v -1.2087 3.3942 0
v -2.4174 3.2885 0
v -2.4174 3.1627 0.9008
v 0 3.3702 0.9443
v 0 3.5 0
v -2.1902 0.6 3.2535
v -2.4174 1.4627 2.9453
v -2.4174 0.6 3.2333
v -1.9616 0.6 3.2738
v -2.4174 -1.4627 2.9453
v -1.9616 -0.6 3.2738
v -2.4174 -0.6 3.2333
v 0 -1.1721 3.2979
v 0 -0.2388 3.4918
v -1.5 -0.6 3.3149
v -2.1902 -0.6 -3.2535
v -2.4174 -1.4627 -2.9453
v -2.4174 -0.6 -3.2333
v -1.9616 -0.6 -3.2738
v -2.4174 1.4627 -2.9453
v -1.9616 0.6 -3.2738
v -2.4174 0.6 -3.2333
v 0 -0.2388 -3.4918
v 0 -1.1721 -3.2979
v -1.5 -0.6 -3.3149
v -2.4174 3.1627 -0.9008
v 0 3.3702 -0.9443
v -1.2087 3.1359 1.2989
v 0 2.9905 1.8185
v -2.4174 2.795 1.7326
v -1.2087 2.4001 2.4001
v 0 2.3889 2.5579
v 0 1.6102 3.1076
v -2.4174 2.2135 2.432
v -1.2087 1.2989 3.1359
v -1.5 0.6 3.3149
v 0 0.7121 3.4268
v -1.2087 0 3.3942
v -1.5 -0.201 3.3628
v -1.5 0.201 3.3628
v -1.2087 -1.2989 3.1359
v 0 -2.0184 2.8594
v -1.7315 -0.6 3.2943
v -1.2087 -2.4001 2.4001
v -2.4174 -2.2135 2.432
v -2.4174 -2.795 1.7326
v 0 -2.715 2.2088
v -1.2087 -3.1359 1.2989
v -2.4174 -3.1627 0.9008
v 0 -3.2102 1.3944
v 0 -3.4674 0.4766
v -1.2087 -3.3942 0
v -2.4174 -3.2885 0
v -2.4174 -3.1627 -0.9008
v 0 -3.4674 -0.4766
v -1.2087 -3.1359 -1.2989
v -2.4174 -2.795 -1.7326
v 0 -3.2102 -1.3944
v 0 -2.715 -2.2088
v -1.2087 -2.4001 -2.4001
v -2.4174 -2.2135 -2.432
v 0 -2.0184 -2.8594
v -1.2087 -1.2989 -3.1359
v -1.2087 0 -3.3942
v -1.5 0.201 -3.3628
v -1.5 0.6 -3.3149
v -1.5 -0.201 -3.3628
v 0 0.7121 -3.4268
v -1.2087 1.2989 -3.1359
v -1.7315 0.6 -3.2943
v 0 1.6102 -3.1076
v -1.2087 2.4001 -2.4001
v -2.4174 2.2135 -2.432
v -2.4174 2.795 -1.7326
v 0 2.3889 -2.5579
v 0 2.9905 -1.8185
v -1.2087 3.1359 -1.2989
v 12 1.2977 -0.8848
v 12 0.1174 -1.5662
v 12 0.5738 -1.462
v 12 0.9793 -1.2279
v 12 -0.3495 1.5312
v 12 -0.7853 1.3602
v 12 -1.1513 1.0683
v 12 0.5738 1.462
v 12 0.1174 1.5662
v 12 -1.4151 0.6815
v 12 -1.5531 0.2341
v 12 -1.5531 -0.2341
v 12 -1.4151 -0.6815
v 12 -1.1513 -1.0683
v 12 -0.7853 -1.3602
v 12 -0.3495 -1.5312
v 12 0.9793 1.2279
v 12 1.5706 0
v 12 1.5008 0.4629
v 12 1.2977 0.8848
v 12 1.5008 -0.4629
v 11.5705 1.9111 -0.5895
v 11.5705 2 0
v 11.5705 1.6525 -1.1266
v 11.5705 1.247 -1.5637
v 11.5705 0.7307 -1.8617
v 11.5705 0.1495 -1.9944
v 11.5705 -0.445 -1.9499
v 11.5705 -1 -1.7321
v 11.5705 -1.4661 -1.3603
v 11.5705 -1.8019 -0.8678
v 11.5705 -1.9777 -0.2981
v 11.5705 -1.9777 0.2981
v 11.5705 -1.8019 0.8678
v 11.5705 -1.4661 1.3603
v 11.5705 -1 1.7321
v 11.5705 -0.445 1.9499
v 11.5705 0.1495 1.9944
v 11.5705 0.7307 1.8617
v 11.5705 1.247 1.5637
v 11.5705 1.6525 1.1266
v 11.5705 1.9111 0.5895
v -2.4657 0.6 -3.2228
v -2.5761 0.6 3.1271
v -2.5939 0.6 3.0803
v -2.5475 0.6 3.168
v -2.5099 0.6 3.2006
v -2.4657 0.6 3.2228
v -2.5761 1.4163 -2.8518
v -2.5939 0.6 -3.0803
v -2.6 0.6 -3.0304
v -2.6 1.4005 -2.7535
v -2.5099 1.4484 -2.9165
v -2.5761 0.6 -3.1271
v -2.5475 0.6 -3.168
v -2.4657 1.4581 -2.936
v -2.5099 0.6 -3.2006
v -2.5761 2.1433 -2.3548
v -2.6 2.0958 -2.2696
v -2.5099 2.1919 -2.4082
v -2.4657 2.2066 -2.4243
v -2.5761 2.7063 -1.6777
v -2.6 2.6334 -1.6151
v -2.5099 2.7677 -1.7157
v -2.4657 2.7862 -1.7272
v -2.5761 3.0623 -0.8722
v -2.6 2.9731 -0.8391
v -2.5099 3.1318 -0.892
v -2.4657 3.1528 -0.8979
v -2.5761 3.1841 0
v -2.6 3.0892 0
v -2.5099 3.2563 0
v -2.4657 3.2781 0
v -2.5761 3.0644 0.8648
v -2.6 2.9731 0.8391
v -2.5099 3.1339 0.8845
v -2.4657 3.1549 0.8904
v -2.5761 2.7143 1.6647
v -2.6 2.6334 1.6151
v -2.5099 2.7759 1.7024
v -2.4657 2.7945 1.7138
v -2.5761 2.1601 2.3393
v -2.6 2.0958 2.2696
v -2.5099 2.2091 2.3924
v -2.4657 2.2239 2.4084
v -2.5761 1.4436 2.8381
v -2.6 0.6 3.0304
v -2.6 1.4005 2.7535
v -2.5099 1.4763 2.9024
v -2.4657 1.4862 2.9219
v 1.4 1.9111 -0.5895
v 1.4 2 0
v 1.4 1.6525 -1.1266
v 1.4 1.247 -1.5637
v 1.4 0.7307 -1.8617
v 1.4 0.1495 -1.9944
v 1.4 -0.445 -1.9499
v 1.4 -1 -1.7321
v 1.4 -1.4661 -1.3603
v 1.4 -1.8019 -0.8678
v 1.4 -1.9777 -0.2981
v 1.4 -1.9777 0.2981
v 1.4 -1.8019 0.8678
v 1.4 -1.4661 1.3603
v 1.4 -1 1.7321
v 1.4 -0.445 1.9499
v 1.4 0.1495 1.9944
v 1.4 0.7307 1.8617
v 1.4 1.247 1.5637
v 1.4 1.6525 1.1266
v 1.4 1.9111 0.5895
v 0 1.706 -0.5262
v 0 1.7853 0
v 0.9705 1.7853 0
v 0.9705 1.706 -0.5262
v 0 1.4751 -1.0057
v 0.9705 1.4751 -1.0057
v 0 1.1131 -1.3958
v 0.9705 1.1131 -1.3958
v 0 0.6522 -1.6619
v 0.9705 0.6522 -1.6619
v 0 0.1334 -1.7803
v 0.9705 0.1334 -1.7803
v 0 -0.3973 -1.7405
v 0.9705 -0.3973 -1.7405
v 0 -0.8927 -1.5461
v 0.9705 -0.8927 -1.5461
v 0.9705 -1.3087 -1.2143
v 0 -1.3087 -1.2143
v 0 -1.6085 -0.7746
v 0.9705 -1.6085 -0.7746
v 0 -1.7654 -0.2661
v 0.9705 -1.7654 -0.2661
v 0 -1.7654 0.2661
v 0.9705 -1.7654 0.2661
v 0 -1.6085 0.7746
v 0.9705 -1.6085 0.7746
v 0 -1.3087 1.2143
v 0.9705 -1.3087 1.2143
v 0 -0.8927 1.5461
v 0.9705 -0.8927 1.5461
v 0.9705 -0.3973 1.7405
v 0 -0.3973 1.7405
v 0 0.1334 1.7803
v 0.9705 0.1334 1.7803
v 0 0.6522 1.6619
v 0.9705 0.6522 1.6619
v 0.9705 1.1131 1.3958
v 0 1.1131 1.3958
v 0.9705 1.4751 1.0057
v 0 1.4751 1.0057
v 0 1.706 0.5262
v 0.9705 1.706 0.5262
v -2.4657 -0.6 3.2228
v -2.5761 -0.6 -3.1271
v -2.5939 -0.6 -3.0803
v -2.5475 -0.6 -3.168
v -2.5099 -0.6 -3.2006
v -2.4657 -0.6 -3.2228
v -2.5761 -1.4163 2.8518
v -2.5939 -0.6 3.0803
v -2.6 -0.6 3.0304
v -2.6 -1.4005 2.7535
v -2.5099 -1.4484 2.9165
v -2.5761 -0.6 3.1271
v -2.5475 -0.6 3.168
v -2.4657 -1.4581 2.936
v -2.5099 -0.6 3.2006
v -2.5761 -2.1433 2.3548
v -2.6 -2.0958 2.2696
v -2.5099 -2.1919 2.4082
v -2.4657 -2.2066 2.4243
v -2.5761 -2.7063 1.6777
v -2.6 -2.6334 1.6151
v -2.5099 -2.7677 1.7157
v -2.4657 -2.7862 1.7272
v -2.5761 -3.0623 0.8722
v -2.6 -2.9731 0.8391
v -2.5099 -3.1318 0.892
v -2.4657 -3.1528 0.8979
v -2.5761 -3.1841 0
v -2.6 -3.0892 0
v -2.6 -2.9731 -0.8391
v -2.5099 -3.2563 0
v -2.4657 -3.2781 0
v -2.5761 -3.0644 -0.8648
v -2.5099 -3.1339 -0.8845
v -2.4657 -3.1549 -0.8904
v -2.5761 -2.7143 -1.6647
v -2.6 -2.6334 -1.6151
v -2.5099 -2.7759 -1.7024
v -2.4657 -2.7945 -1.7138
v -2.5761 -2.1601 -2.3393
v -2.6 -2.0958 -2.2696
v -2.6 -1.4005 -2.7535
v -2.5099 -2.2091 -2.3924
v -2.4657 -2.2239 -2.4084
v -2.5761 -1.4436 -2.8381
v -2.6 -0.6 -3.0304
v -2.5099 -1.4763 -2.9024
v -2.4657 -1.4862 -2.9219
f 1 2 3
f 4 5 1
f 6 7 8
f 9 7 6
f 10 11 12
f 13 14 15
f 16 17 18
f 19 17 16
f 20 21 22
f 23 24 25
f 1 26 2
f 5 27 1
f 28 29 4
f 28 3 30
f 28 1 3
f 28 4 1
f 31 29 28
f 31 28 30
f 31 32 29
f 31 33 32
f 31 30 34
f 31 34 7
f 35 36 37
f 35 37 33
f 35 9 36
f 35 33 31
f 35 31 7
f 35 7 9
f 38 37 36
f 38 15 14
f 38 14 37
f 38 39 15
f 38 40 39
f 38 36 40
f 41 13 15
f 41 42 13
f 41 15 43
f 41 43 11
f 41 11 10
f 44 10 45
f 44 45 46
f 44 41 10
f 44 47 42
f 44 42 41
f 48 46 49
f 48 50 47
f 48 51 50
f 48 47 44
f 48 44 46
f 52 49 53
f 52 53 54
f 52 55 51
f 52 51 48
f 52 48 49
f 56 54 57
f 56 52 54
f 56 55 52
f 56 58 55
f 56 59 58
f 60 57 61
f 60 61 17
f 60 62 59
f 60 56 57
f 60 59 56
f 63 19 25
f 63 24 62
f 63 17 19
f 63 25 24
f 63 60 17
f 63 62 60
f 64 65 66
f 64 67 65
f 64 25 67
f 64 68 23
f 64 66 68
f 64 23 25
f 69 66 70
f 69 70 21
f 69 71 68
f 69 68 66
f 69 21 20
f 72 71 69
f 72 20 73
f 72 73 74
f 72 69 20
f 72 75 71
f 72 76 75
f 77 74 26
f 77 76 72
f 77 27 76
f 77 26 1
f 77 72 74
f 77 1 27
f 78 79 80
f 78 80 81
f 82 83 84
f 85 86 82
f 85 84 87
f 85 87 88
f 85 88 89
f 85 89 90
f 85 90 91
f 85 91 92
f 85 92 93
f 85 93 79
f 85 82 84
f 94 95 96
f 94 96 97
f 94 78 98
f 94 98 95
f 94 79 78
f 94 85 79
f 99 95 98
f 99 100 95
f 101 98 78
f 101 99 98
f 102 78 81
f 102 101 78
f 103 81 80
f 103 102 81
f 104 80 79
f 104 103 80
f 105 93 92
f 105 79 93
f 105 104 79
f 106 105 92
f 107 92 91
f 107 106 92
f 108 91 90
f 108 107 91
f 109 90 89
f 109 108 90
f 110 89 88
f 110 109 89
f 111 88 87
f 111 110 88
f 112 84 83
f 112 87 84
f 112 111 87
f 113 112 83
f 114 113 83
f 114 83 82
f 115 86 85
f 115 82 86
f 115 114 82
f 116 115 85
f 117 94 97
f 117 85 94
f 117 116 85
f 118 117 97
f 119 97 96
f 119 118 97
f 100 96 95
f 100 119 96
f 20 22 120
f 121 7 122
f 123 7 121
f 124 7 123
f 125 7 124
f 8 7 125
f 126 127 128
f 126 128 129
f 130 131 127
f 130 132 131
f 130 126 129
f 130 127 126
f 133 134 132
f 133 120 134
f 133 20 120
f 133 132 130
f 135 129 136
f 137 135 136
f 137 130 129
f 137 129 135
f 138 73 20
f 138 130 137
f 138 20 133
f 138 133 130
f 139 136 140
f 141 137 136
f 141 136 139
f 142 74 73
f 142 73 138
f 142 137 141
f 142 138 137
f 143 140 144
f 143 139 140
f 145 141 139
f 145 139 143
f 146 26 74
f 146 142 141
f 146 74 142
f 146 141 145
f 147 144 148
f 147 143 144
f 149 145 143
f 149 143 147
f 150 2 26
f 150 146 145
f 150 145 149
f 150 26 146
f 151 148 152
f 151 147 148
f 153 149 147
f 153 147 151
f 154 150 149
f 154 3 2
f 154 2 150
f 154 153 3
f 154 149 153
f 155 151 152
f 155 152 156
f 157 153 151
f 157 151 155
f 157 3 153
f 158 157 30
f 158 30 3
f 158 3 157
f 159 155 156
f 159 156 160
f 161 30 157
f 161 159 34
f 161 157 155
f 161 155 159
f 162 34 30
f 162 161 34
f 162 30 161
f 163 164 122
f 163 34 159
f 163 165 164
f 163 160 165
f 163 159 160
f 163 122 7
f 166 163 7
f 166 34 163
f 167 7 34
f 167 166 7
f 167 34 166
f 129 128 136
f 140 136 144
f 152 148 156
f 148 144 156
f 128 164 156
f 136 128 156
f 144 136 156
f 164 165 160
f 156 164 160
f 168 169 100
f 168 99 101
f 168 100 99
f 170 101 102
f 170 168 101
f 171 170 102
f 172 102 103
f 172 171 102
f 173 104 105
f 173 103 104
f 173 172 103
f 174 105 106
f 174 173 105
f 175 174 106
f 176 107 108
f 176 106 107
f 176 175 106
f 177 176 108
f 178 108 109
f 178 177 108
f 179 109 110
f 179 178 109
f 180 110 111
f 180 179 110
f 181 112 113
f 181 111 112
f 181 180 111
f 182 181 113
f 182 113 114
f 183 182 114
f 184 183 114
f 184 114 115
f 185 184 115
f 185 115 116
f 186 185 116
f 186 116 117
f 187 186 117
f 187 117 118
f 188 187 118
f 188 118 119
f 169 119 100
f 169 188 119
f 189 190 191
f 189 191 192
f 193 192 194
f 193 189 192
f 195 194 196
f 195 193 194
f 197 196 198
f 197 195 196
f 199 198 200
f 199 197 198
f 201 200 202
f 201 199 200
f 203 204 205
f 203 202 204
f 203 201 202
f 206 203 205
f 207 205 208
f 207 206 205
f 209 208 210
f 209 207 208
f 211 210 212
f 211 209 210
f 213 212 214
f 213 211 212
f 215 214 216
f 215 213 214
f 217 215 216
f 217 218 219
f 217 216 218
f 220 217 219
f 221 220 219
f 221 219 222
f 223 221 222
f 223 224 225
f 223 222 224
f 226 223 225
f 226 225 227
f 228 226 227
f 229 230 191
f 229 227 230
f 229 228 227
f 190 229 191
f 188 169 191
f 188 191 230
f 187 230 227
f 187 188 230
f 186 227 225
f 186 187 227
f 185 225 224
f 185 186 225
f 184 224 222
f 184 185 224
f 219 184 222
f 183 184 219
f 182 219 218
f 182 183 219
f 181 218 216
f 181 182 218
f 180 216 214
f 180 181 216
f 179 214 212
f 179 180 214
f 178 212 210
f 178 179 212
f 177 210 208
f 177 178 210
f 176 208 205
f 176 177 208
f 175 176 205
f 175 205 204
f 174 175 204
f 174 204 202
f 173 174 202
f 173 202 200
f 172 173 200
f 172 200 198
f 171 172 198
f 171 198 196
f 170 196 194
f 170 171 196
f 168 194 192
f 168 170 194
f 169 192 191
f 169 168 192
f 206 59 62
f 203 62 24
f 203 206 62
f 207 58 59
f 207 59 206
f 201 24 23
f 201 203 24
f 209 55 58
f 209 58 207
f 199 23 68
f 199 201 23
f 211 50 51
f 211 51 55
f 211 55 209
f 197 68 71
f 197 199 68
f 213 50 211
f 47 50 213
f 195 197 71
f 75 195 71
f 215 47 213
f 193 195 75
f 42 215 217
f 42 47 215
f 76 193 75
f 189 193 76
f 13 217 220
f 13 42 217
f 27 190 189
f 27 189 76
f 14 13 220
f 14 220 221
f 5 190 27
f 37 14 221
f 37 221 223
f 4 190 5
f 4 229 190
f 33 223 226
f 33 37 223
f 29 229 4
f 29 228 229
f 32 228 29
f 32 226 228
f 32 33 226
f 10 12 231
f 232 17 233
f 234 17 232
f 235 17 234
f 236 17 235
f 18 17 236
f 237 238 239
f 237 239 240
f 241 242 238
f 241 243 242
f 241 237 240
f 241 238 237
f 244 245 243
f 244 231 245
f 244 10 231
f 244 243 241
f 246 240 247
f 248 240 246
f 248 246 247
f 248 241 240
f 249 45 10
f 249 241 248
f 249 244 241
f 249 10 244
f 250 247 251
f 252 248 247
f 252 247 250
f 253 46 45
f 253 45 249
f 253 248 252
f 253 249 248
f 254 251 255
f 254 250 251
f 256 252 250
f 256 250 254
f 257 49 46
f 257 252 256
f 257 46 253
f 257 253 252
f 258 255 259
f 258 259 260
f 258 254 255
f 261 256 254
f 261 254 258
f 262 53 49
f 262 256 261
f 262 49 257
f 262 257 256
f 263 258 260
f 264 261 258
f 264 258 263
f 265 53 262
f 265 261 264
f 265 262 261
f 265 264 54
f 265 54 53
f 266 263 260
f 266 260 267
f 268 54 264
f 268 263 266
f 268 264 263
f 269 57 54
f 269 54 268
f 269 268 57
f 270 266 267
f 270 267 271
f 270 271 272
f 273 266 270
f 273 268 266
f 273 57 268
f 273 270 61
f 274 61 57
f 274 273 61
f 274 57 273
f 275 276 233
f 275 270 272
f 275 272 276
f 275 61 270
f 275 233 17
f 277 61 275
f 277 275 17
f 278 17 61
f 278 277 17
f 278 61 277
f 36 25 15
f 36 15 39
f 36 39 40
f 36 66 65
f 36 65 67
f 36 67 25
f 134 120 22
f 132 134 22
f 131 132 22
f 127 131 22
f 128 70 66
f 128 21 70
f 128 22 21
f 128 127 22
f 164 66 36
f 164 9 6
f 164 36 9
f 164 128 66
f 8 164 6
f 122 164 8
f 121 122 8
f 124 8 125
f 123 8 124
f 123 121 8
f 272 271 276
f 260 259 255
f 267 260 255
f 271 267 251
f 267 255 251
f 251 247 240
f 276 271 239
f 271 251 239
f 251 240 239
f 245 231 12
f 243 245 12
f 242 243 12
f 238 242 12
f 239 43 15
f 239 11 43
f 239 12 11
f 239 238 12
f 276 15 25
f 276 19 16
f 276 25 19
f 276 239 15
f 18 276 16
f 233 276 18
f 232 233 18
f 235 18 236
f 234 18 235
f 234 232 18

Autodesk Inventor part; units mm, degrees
ref_plane "YZ Plane" through (0, 0, 0) normal (1, 0, 0) x (0, 1, 0)
ref_plane "XZ Plane" through (0, 0, 0) normal (0, 1, 0) x (-1, 0, 0)
sketch "Sketch1" plane through (0, 0, 0) normal (0, 0, 1) x (1, 0, 0)
  line L0 (-2.6, 0) -> (12, 0)
  line L1 (12, 0) -> (12, 2)
  line L2 (12, 2) -> (1.4, 2)
  line L3 (1.4, 2) -> (0.9705, 1.7853)
  line L4 (0.9705, 1.7853) -> (0, 1.7853)
  line L5 (0, 1.7853) -> (0, 3.5)
  line L6 (-5.52, 0) -> (14.92, 0) projected
  line L7 (0, -0.7) -> (0, 4.2) projected
  line L8 (-2.6, 0) -> (-2.6, 3.2725)
  line L9 (0, 3.5) -> (-2.6, 3.2725)
  line L10 (1.4, 2) -> (0, 2) construction
  dimension "d0" = 12
  dimension "d1" = 10.6
  dimension "d2" = 0.4295
  dimension "d3" = 2.6
  dimension "d4" = 4
  dimension "d5" = 3.5705
  dimension "d9" = 7
  dimension "d10" = 5
revolve "Body" add sketch "Sketch1" angle 360 about axis through (-2.6, 0, 0) along (1, 0, 0)
sketch "Sketch2" plane through (-2.6, 0, 0) normal (-1, 0, 0) x (0, 0, 1)
  circle A0 centre (0, 0) radius 3.5 projected
  line L0 (0, 0) -> (0, 3.2725) projected
  line L1 (-3.5, 0.6) -> (3.5, 0.6)
  line L2 (3.5, 0.6) -> (3.5, -0.6)
  line L3 (3.5, -0.6) -> (-3.5, -0.6)
  line L4 (-3.5, -0.6) -> (-3.5, 0.6)
  line L5 (-3.5, 0) -> (3.5, 0) construction
  line L6 (0, 0.6) -> (0, -0.6) construction
  dimension "d11" = 1.2
  dimension "d12" = 7
fillet "Fillet1" radius 0.2 1 edges at (-2.6, -3.2725, 0)
extrude "Slot" cut sketch "Sketch2" against normal blind 1.1 contours A0 L3 L1 | L2 L3 A0 | A0 L1 L2 | A0 L4 L1 | L3 L4 A0
thread "Thread" size "M4x0.7" class "6g" standard "ISO Metric profile" length 10.6
chamfer "Chamfer1" distance 0.4294 distance2 0.4295 1 edges at (12, -2, 0) measured on face at (12, 0.6473, -0.1595)
ref_plane "Work Plane1" through (30.1625, 0, 0) normal (0, 0, -1) x (1, 0, 0)
equation "\"d11\" = SBR"
equation "\"d12\" = KOD"
equation "\"d19\" = STI"
equation "\"d14\" = RR"
equation "\"d15\" = GEL"
equation "\"d17\" = -0.5 * SPD + 0.5 * GD"
equation "\"d0\" = NLG"
equation "\"d1\" = GEL"
equation "\"d3\" = KOH"
equation "\"d4\" = GD"
equation "\"d5\" = BDM"
equation "\"d9\" = KOD"
equation "\"d10\" = KEWI"
equation "\"GD\" = NND"
equation "\"NLG\" = 12"
equation "\"GEL\" = 10.6"
equation "\"KOD\" = 7"
equation "\"KOH\" = 2.6"
equation "\"GAL\" = 0.61345 * PTC"
equation "\"SPD\" = NND - 1.2269 * PTC"
equation "\"BDM\" = 3.5705"
equation "\"GUL\" = 0.61345 * PTC"
equation "\"RR\" = 0.2"
equation "\"SBR\" = 1.2"
equation "\"STI\" = 1.1"
equation "\"KEWI\" = 5deg"
equation "\"PTC\" = 0.7"
equation "\"THREADDIA\" = 4"
equation "\"TOA\" = 30deg"
equation "\"NND\" = 4"
equation "\"GD1\" = THREADDIA - 1.2269 * PTC"
properties part number "ISO 1207 - M4 x 12" material "Stainless Steel, 440C"
